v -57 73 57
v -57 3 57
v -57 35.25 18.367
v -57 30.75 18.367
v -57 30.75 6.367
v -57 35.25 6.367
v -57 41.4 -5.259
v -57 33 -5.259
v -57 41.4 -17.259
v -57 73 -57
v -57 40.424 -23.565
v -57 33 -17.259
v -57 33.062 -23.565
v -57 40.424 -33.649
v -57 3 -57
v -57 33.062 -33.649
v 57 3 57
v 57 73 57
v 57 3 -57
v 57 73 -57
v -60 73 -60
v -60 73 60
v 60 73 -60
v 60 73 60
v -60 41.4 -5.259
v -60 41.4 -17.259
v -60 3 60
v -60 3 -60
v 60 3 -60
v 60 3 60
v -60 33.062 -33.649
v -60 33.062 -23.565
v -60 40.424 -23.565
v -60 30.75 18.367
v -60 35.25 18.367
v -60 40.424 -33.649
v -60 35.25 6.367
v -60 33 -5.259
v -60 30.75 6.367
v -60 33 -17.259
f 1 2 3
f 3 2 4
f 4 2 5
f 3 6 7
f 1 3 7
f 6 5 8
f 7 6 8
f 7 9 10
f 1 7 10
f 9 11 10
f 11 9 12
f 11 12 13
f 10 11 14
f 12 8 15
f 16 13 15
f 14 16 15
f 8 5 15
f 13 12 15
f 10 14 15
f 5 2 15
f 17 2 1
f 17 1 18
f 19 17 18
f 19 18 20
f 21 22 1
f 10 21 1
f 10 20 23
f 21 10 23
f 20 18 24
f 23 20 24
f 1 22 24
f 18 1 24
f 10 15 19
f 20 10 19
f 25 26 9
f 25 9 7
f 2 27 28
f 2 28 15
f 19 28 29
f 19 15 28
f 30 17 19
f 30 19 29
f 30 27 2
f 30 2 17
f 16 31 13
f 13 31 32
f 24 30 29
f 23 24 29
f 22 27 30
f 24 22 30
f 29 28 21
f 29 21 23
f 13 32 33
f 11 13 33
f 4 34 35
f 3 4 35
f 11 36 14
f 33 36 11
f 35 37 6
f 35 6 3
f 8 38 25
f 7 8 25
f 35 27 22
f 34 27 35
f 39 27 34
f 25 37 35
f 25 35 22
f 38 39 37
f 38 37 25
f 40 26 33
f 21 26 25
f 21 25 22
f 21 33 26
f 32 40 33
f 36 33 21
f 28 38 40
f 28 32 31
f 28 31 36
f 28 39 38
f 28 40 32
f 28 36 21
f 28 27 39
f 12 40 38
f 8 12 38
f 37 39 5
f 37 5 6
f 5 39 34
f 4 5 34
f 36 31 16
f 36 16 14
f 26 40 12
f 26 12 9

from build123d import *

# Parameters (mm, degrees)
SKETCH1_W           = 140
SKETCH1_H           = 160
BOSS_EXTRUDE1_DEPTH = 3
SKETCH2_W           = 120
SKETCH2_H           = 120
SKETCH2_W_2         = 114
SKETCH2_H_2         = 114
BOSS_EXTRUDE2_DEPTH = 70
SKETCH4_W           = 120
SKETCH4_H           = 120
BOSS_EXTRUDE4_DEPTH = 3
SKETCH5_R           = 2.1
SKETCH5_W           = 39.9
SKETCH5_H           = 19.71
CUT_EXTRUDE2_DEPTH  = 3
SKETCH6_W           = 18.298163042
SKETCH6_H           = 17.309993256
CUT_EXTRUDE3_DEPTH  = 3
CUT_EXTRUDE8_DEPTH  = 5
SKETCH15_W          = 259.021634325
SKETCH15_H          = 180.269434884
BOSS_EXTRUDE5_DEPTH = 3
SKETCH18_R          = 1.6
CUT_EXTRUDE9_DEPTH  = 10
SKETCH19_W          = 12
SKETCH19_H          = 4.5
SKETCH19_H_2        = 8.4
SKETCH19_W_2        = 10.084057066
SKETCH19_H_3        = 7.362028533
CUT_EXTRUDE11_DEPTH = 5
SKETCH20_W          = 263.921538054
SKETCH20_H          = 19.630552878
SKETCH20_W_2        = 120
SKETCH20_H_2        = 3
CUT_EXTRUDE12_DEPTH = 233.259150239
SKETCH21_W          = 259.021634325
SKETCH21_H          = 40.269434884
CUT_EXTRUDE13_DEPTH = 209.619923406


with BuildPart() as part:
    # Sketch1 → Boss-Extrude1 (new body)
    with BuildSketch(Plane(origin=(0, 0, 0), x_dir=(1, 0, 0), z_dir=(0, 1, 0))):
        Rectangle(SKETCH1_W, SKETCH1_H)
    extrude(amount=BOSS_EXTRUDE1_DEPTH)

    # Sketch2 → Boss-Extrude2 (add)
    with BuildSketch(Plane(origin=(0, 3, 0), x_dir=(1, 0, 0), z_dir=(0, 1, 0))):
        Rectangle(SKETCH2_W, SKETCH2_H)
        Rectangle(SKETCH2_W_2, SKETCH2_H_2, mode=Mode.SUBTRACT)
    extrude(amount=BOSS_EXTRUDE2_DEPTH)

    # Sketch4 → Boss-Extrude4 (add)
    with BuildSketch(Plane(origin=(0, 73, 0), x_dir=(1, 0, 0), z_dir=(0, 1, 0))):
        Rectangle(SKETCH4_W, SKETCH4_H)
    extrude(amount=BOSS_EXTRUDE4_DEPTH)

    # Sketch5 → Cut-Extrude2 (cut)
    with BuildSketch(Plane(origin=(0, 76, 0), x_dir=(1, 0, 0), z_dir=(0, 1, 0))):
        with Locations(Location((34.39, -4.925, 0), (0, 0, 270))):
            Circle(SKETCH5_R)
        with Locations(Location((34.39, 4.925, 0), (0, 0, 270))):
            Circle(SKETCH5_R)
        with Locations(Location((-15.03, -4.925, 0), (0, 0, 270))):
            Circle(SKETCH5_R)
        with Locations(Location((-15.03, 4.925, 0), (0, 0, 270))):
            Circle(SKETCH5_R)
        with Locations((9.68, 0)):
            Rectangle(SKETCH5_W, SKETCH5_H)
    extrude(amount=-CUT_EXTRUDE2_DEPTH, mode=Mode.SUBTRACT)

    # Sketch6 → Cut-Extrude3 (cut)
    with BuildSketch(Plane(origin=(0, 76, 0), x_dir=(1, 0, 0), z_dir=(0, 1, 0))):
        Rectangle(SKETCH6_W, SKETCH6_H)
    extrude(amount=-CUT_EXTRUDE3_DEPTH, mode=Mode.SUBTRACT)

    # Sketch13 → Cut-Extrude8 (cut)
    with BuildSketch(Plane(origin=(0, 76, 0), x_dir=(1, 0, 0), z_dir=(0, 1, 0))):
        with BuildLine():
            ThreePointArc((-3.792582359, 49.728765052), (-53.491503795, -1.722579942), (-0.349490011, -49.609426409))
            ThreePointArc((-0.349490011, -49.609426409), (5.82592347, -42.51288634), (-1.270616599, -36.337472859))
            ThreePointArc((-1.270616599, -36.337472859), (-40.195607742, -1.261740085), (-3.792582359, 36.42488497))
            ThreePointArc((-3.792582359, 36.42488497), (2.859357682, 43.076825011), (-3.792582359, 49.728765052))
        make_face()
    extrude(amount=-CUT_EXTRUDE8_DEPTH, mode=Mode.SUBTRACT)

    # Sketch15 → Boss-Extrude5 (add)
    with BuildSketch(Plane(origin=(0, 3, 0), x_dir=(1, 0, 0), z_dir=(0, 1, 0))):
        with Locations((-39.510817163, -10.134717442)):
            Rectangle(SKETCH15_W, SKETCH15_H)
    extrude(amount=-BOSS_EXTRUDE5_DEPTH)

    # Sketch18 → Cut-Extrude9 (cut)
    with BuildSketch(Plane(origin=(0, 3, 0), x_dir=(1, 0, 0), z_dir=(0, 1, 0))):
        with Locations(Location((-55.452, -27.227420358, 0), (0, 0, 194.647469308))):
            Circle(SKETCH18_R)
        with Locations(Location((-55.452, 32.208579642, 0), (0, 0, 194.647469308))):
            Circle(SKETCH18_R)
        with Locations(Location((4.746, 32.208579642, 0), (0, 0, 270))):
            Circle(SKETCH18_R)
        with Locations(Location((4.746, -27.227420358, 0), (0, 0, 270))):
            Circle(SKETCH18_R)
    extrude(amount=-CUT_EXTRUDE9_DEPTH, mode=Mode.SUBTRACT)

    # Sketch19 → Cut-Extrude11 (cut)
    with BuildSketch(Plane.ZY.offset(60)):
        with Locations((12.367420358, 33)):
            Rectangle(SKETCH19_W, SKETCH19_H)
        with Locations((-11.259414931, 37.2)):
            Rectangle(SKETCH19_W, SKETCH19_H_2)
        with Locations((-28.606781654, 36.742945388)):
            Rectangle(SKETCH19_W_2, SKETCH19_H_3)
    extrude(amount=-CUT_EXTRUDE11_DEPTH, mode=Mode.SUBTRACT)

    # Sketch20 → Cut-Extrude12 (cut, through all)
    with BuildSketch(Plane.XY.offset(60)):
        with Locations((-37.060865298, -6.815276439)):
            Rectangle(SKETCH20_W, SKETCH20_H)
        with Locations((0, 74.5)):
            Rectangle(SKETCH20_W_2, SKETCH20_H_2)
    extrude(amount=-CUT_EXTRUDE12_DEPTH, mode=Mode.SUBTRACT)


with BuildPart() as cut_extrude12_piece_1:
    # of the separate pieces the step leaves, piece 1, a body of its own (cut_extrude12_pieces)
    add(part.part.solids().sort_by_distance((60, 73, 60))[0])


with BuildPart() as cut_extrude12_piece_2:
    # of the separate pieces the step leaves, piece 2, a body of its own (cut_extrude12_pieces)
    add(part.part.solids().sort_by_distance((90, 0, 60))[0])

    # Sketch21 → Cut-Extrude13 (cut, through all)
    with BuildSketch(Plane(origin=(0, 3, 0), x_dir=(1, 0, 0), z_dir=(0, 1, 0))):
        with Locations((-39.510817163, -80.134717442)):
            Rectangle(SKETCH21_W, SKETCH21_H)
    extrude(amount=-CUT_EXTRUDE13_DEPTH, mode=Mode.SUBTRACT)


solid = cut_extrude12_piece_1.part
